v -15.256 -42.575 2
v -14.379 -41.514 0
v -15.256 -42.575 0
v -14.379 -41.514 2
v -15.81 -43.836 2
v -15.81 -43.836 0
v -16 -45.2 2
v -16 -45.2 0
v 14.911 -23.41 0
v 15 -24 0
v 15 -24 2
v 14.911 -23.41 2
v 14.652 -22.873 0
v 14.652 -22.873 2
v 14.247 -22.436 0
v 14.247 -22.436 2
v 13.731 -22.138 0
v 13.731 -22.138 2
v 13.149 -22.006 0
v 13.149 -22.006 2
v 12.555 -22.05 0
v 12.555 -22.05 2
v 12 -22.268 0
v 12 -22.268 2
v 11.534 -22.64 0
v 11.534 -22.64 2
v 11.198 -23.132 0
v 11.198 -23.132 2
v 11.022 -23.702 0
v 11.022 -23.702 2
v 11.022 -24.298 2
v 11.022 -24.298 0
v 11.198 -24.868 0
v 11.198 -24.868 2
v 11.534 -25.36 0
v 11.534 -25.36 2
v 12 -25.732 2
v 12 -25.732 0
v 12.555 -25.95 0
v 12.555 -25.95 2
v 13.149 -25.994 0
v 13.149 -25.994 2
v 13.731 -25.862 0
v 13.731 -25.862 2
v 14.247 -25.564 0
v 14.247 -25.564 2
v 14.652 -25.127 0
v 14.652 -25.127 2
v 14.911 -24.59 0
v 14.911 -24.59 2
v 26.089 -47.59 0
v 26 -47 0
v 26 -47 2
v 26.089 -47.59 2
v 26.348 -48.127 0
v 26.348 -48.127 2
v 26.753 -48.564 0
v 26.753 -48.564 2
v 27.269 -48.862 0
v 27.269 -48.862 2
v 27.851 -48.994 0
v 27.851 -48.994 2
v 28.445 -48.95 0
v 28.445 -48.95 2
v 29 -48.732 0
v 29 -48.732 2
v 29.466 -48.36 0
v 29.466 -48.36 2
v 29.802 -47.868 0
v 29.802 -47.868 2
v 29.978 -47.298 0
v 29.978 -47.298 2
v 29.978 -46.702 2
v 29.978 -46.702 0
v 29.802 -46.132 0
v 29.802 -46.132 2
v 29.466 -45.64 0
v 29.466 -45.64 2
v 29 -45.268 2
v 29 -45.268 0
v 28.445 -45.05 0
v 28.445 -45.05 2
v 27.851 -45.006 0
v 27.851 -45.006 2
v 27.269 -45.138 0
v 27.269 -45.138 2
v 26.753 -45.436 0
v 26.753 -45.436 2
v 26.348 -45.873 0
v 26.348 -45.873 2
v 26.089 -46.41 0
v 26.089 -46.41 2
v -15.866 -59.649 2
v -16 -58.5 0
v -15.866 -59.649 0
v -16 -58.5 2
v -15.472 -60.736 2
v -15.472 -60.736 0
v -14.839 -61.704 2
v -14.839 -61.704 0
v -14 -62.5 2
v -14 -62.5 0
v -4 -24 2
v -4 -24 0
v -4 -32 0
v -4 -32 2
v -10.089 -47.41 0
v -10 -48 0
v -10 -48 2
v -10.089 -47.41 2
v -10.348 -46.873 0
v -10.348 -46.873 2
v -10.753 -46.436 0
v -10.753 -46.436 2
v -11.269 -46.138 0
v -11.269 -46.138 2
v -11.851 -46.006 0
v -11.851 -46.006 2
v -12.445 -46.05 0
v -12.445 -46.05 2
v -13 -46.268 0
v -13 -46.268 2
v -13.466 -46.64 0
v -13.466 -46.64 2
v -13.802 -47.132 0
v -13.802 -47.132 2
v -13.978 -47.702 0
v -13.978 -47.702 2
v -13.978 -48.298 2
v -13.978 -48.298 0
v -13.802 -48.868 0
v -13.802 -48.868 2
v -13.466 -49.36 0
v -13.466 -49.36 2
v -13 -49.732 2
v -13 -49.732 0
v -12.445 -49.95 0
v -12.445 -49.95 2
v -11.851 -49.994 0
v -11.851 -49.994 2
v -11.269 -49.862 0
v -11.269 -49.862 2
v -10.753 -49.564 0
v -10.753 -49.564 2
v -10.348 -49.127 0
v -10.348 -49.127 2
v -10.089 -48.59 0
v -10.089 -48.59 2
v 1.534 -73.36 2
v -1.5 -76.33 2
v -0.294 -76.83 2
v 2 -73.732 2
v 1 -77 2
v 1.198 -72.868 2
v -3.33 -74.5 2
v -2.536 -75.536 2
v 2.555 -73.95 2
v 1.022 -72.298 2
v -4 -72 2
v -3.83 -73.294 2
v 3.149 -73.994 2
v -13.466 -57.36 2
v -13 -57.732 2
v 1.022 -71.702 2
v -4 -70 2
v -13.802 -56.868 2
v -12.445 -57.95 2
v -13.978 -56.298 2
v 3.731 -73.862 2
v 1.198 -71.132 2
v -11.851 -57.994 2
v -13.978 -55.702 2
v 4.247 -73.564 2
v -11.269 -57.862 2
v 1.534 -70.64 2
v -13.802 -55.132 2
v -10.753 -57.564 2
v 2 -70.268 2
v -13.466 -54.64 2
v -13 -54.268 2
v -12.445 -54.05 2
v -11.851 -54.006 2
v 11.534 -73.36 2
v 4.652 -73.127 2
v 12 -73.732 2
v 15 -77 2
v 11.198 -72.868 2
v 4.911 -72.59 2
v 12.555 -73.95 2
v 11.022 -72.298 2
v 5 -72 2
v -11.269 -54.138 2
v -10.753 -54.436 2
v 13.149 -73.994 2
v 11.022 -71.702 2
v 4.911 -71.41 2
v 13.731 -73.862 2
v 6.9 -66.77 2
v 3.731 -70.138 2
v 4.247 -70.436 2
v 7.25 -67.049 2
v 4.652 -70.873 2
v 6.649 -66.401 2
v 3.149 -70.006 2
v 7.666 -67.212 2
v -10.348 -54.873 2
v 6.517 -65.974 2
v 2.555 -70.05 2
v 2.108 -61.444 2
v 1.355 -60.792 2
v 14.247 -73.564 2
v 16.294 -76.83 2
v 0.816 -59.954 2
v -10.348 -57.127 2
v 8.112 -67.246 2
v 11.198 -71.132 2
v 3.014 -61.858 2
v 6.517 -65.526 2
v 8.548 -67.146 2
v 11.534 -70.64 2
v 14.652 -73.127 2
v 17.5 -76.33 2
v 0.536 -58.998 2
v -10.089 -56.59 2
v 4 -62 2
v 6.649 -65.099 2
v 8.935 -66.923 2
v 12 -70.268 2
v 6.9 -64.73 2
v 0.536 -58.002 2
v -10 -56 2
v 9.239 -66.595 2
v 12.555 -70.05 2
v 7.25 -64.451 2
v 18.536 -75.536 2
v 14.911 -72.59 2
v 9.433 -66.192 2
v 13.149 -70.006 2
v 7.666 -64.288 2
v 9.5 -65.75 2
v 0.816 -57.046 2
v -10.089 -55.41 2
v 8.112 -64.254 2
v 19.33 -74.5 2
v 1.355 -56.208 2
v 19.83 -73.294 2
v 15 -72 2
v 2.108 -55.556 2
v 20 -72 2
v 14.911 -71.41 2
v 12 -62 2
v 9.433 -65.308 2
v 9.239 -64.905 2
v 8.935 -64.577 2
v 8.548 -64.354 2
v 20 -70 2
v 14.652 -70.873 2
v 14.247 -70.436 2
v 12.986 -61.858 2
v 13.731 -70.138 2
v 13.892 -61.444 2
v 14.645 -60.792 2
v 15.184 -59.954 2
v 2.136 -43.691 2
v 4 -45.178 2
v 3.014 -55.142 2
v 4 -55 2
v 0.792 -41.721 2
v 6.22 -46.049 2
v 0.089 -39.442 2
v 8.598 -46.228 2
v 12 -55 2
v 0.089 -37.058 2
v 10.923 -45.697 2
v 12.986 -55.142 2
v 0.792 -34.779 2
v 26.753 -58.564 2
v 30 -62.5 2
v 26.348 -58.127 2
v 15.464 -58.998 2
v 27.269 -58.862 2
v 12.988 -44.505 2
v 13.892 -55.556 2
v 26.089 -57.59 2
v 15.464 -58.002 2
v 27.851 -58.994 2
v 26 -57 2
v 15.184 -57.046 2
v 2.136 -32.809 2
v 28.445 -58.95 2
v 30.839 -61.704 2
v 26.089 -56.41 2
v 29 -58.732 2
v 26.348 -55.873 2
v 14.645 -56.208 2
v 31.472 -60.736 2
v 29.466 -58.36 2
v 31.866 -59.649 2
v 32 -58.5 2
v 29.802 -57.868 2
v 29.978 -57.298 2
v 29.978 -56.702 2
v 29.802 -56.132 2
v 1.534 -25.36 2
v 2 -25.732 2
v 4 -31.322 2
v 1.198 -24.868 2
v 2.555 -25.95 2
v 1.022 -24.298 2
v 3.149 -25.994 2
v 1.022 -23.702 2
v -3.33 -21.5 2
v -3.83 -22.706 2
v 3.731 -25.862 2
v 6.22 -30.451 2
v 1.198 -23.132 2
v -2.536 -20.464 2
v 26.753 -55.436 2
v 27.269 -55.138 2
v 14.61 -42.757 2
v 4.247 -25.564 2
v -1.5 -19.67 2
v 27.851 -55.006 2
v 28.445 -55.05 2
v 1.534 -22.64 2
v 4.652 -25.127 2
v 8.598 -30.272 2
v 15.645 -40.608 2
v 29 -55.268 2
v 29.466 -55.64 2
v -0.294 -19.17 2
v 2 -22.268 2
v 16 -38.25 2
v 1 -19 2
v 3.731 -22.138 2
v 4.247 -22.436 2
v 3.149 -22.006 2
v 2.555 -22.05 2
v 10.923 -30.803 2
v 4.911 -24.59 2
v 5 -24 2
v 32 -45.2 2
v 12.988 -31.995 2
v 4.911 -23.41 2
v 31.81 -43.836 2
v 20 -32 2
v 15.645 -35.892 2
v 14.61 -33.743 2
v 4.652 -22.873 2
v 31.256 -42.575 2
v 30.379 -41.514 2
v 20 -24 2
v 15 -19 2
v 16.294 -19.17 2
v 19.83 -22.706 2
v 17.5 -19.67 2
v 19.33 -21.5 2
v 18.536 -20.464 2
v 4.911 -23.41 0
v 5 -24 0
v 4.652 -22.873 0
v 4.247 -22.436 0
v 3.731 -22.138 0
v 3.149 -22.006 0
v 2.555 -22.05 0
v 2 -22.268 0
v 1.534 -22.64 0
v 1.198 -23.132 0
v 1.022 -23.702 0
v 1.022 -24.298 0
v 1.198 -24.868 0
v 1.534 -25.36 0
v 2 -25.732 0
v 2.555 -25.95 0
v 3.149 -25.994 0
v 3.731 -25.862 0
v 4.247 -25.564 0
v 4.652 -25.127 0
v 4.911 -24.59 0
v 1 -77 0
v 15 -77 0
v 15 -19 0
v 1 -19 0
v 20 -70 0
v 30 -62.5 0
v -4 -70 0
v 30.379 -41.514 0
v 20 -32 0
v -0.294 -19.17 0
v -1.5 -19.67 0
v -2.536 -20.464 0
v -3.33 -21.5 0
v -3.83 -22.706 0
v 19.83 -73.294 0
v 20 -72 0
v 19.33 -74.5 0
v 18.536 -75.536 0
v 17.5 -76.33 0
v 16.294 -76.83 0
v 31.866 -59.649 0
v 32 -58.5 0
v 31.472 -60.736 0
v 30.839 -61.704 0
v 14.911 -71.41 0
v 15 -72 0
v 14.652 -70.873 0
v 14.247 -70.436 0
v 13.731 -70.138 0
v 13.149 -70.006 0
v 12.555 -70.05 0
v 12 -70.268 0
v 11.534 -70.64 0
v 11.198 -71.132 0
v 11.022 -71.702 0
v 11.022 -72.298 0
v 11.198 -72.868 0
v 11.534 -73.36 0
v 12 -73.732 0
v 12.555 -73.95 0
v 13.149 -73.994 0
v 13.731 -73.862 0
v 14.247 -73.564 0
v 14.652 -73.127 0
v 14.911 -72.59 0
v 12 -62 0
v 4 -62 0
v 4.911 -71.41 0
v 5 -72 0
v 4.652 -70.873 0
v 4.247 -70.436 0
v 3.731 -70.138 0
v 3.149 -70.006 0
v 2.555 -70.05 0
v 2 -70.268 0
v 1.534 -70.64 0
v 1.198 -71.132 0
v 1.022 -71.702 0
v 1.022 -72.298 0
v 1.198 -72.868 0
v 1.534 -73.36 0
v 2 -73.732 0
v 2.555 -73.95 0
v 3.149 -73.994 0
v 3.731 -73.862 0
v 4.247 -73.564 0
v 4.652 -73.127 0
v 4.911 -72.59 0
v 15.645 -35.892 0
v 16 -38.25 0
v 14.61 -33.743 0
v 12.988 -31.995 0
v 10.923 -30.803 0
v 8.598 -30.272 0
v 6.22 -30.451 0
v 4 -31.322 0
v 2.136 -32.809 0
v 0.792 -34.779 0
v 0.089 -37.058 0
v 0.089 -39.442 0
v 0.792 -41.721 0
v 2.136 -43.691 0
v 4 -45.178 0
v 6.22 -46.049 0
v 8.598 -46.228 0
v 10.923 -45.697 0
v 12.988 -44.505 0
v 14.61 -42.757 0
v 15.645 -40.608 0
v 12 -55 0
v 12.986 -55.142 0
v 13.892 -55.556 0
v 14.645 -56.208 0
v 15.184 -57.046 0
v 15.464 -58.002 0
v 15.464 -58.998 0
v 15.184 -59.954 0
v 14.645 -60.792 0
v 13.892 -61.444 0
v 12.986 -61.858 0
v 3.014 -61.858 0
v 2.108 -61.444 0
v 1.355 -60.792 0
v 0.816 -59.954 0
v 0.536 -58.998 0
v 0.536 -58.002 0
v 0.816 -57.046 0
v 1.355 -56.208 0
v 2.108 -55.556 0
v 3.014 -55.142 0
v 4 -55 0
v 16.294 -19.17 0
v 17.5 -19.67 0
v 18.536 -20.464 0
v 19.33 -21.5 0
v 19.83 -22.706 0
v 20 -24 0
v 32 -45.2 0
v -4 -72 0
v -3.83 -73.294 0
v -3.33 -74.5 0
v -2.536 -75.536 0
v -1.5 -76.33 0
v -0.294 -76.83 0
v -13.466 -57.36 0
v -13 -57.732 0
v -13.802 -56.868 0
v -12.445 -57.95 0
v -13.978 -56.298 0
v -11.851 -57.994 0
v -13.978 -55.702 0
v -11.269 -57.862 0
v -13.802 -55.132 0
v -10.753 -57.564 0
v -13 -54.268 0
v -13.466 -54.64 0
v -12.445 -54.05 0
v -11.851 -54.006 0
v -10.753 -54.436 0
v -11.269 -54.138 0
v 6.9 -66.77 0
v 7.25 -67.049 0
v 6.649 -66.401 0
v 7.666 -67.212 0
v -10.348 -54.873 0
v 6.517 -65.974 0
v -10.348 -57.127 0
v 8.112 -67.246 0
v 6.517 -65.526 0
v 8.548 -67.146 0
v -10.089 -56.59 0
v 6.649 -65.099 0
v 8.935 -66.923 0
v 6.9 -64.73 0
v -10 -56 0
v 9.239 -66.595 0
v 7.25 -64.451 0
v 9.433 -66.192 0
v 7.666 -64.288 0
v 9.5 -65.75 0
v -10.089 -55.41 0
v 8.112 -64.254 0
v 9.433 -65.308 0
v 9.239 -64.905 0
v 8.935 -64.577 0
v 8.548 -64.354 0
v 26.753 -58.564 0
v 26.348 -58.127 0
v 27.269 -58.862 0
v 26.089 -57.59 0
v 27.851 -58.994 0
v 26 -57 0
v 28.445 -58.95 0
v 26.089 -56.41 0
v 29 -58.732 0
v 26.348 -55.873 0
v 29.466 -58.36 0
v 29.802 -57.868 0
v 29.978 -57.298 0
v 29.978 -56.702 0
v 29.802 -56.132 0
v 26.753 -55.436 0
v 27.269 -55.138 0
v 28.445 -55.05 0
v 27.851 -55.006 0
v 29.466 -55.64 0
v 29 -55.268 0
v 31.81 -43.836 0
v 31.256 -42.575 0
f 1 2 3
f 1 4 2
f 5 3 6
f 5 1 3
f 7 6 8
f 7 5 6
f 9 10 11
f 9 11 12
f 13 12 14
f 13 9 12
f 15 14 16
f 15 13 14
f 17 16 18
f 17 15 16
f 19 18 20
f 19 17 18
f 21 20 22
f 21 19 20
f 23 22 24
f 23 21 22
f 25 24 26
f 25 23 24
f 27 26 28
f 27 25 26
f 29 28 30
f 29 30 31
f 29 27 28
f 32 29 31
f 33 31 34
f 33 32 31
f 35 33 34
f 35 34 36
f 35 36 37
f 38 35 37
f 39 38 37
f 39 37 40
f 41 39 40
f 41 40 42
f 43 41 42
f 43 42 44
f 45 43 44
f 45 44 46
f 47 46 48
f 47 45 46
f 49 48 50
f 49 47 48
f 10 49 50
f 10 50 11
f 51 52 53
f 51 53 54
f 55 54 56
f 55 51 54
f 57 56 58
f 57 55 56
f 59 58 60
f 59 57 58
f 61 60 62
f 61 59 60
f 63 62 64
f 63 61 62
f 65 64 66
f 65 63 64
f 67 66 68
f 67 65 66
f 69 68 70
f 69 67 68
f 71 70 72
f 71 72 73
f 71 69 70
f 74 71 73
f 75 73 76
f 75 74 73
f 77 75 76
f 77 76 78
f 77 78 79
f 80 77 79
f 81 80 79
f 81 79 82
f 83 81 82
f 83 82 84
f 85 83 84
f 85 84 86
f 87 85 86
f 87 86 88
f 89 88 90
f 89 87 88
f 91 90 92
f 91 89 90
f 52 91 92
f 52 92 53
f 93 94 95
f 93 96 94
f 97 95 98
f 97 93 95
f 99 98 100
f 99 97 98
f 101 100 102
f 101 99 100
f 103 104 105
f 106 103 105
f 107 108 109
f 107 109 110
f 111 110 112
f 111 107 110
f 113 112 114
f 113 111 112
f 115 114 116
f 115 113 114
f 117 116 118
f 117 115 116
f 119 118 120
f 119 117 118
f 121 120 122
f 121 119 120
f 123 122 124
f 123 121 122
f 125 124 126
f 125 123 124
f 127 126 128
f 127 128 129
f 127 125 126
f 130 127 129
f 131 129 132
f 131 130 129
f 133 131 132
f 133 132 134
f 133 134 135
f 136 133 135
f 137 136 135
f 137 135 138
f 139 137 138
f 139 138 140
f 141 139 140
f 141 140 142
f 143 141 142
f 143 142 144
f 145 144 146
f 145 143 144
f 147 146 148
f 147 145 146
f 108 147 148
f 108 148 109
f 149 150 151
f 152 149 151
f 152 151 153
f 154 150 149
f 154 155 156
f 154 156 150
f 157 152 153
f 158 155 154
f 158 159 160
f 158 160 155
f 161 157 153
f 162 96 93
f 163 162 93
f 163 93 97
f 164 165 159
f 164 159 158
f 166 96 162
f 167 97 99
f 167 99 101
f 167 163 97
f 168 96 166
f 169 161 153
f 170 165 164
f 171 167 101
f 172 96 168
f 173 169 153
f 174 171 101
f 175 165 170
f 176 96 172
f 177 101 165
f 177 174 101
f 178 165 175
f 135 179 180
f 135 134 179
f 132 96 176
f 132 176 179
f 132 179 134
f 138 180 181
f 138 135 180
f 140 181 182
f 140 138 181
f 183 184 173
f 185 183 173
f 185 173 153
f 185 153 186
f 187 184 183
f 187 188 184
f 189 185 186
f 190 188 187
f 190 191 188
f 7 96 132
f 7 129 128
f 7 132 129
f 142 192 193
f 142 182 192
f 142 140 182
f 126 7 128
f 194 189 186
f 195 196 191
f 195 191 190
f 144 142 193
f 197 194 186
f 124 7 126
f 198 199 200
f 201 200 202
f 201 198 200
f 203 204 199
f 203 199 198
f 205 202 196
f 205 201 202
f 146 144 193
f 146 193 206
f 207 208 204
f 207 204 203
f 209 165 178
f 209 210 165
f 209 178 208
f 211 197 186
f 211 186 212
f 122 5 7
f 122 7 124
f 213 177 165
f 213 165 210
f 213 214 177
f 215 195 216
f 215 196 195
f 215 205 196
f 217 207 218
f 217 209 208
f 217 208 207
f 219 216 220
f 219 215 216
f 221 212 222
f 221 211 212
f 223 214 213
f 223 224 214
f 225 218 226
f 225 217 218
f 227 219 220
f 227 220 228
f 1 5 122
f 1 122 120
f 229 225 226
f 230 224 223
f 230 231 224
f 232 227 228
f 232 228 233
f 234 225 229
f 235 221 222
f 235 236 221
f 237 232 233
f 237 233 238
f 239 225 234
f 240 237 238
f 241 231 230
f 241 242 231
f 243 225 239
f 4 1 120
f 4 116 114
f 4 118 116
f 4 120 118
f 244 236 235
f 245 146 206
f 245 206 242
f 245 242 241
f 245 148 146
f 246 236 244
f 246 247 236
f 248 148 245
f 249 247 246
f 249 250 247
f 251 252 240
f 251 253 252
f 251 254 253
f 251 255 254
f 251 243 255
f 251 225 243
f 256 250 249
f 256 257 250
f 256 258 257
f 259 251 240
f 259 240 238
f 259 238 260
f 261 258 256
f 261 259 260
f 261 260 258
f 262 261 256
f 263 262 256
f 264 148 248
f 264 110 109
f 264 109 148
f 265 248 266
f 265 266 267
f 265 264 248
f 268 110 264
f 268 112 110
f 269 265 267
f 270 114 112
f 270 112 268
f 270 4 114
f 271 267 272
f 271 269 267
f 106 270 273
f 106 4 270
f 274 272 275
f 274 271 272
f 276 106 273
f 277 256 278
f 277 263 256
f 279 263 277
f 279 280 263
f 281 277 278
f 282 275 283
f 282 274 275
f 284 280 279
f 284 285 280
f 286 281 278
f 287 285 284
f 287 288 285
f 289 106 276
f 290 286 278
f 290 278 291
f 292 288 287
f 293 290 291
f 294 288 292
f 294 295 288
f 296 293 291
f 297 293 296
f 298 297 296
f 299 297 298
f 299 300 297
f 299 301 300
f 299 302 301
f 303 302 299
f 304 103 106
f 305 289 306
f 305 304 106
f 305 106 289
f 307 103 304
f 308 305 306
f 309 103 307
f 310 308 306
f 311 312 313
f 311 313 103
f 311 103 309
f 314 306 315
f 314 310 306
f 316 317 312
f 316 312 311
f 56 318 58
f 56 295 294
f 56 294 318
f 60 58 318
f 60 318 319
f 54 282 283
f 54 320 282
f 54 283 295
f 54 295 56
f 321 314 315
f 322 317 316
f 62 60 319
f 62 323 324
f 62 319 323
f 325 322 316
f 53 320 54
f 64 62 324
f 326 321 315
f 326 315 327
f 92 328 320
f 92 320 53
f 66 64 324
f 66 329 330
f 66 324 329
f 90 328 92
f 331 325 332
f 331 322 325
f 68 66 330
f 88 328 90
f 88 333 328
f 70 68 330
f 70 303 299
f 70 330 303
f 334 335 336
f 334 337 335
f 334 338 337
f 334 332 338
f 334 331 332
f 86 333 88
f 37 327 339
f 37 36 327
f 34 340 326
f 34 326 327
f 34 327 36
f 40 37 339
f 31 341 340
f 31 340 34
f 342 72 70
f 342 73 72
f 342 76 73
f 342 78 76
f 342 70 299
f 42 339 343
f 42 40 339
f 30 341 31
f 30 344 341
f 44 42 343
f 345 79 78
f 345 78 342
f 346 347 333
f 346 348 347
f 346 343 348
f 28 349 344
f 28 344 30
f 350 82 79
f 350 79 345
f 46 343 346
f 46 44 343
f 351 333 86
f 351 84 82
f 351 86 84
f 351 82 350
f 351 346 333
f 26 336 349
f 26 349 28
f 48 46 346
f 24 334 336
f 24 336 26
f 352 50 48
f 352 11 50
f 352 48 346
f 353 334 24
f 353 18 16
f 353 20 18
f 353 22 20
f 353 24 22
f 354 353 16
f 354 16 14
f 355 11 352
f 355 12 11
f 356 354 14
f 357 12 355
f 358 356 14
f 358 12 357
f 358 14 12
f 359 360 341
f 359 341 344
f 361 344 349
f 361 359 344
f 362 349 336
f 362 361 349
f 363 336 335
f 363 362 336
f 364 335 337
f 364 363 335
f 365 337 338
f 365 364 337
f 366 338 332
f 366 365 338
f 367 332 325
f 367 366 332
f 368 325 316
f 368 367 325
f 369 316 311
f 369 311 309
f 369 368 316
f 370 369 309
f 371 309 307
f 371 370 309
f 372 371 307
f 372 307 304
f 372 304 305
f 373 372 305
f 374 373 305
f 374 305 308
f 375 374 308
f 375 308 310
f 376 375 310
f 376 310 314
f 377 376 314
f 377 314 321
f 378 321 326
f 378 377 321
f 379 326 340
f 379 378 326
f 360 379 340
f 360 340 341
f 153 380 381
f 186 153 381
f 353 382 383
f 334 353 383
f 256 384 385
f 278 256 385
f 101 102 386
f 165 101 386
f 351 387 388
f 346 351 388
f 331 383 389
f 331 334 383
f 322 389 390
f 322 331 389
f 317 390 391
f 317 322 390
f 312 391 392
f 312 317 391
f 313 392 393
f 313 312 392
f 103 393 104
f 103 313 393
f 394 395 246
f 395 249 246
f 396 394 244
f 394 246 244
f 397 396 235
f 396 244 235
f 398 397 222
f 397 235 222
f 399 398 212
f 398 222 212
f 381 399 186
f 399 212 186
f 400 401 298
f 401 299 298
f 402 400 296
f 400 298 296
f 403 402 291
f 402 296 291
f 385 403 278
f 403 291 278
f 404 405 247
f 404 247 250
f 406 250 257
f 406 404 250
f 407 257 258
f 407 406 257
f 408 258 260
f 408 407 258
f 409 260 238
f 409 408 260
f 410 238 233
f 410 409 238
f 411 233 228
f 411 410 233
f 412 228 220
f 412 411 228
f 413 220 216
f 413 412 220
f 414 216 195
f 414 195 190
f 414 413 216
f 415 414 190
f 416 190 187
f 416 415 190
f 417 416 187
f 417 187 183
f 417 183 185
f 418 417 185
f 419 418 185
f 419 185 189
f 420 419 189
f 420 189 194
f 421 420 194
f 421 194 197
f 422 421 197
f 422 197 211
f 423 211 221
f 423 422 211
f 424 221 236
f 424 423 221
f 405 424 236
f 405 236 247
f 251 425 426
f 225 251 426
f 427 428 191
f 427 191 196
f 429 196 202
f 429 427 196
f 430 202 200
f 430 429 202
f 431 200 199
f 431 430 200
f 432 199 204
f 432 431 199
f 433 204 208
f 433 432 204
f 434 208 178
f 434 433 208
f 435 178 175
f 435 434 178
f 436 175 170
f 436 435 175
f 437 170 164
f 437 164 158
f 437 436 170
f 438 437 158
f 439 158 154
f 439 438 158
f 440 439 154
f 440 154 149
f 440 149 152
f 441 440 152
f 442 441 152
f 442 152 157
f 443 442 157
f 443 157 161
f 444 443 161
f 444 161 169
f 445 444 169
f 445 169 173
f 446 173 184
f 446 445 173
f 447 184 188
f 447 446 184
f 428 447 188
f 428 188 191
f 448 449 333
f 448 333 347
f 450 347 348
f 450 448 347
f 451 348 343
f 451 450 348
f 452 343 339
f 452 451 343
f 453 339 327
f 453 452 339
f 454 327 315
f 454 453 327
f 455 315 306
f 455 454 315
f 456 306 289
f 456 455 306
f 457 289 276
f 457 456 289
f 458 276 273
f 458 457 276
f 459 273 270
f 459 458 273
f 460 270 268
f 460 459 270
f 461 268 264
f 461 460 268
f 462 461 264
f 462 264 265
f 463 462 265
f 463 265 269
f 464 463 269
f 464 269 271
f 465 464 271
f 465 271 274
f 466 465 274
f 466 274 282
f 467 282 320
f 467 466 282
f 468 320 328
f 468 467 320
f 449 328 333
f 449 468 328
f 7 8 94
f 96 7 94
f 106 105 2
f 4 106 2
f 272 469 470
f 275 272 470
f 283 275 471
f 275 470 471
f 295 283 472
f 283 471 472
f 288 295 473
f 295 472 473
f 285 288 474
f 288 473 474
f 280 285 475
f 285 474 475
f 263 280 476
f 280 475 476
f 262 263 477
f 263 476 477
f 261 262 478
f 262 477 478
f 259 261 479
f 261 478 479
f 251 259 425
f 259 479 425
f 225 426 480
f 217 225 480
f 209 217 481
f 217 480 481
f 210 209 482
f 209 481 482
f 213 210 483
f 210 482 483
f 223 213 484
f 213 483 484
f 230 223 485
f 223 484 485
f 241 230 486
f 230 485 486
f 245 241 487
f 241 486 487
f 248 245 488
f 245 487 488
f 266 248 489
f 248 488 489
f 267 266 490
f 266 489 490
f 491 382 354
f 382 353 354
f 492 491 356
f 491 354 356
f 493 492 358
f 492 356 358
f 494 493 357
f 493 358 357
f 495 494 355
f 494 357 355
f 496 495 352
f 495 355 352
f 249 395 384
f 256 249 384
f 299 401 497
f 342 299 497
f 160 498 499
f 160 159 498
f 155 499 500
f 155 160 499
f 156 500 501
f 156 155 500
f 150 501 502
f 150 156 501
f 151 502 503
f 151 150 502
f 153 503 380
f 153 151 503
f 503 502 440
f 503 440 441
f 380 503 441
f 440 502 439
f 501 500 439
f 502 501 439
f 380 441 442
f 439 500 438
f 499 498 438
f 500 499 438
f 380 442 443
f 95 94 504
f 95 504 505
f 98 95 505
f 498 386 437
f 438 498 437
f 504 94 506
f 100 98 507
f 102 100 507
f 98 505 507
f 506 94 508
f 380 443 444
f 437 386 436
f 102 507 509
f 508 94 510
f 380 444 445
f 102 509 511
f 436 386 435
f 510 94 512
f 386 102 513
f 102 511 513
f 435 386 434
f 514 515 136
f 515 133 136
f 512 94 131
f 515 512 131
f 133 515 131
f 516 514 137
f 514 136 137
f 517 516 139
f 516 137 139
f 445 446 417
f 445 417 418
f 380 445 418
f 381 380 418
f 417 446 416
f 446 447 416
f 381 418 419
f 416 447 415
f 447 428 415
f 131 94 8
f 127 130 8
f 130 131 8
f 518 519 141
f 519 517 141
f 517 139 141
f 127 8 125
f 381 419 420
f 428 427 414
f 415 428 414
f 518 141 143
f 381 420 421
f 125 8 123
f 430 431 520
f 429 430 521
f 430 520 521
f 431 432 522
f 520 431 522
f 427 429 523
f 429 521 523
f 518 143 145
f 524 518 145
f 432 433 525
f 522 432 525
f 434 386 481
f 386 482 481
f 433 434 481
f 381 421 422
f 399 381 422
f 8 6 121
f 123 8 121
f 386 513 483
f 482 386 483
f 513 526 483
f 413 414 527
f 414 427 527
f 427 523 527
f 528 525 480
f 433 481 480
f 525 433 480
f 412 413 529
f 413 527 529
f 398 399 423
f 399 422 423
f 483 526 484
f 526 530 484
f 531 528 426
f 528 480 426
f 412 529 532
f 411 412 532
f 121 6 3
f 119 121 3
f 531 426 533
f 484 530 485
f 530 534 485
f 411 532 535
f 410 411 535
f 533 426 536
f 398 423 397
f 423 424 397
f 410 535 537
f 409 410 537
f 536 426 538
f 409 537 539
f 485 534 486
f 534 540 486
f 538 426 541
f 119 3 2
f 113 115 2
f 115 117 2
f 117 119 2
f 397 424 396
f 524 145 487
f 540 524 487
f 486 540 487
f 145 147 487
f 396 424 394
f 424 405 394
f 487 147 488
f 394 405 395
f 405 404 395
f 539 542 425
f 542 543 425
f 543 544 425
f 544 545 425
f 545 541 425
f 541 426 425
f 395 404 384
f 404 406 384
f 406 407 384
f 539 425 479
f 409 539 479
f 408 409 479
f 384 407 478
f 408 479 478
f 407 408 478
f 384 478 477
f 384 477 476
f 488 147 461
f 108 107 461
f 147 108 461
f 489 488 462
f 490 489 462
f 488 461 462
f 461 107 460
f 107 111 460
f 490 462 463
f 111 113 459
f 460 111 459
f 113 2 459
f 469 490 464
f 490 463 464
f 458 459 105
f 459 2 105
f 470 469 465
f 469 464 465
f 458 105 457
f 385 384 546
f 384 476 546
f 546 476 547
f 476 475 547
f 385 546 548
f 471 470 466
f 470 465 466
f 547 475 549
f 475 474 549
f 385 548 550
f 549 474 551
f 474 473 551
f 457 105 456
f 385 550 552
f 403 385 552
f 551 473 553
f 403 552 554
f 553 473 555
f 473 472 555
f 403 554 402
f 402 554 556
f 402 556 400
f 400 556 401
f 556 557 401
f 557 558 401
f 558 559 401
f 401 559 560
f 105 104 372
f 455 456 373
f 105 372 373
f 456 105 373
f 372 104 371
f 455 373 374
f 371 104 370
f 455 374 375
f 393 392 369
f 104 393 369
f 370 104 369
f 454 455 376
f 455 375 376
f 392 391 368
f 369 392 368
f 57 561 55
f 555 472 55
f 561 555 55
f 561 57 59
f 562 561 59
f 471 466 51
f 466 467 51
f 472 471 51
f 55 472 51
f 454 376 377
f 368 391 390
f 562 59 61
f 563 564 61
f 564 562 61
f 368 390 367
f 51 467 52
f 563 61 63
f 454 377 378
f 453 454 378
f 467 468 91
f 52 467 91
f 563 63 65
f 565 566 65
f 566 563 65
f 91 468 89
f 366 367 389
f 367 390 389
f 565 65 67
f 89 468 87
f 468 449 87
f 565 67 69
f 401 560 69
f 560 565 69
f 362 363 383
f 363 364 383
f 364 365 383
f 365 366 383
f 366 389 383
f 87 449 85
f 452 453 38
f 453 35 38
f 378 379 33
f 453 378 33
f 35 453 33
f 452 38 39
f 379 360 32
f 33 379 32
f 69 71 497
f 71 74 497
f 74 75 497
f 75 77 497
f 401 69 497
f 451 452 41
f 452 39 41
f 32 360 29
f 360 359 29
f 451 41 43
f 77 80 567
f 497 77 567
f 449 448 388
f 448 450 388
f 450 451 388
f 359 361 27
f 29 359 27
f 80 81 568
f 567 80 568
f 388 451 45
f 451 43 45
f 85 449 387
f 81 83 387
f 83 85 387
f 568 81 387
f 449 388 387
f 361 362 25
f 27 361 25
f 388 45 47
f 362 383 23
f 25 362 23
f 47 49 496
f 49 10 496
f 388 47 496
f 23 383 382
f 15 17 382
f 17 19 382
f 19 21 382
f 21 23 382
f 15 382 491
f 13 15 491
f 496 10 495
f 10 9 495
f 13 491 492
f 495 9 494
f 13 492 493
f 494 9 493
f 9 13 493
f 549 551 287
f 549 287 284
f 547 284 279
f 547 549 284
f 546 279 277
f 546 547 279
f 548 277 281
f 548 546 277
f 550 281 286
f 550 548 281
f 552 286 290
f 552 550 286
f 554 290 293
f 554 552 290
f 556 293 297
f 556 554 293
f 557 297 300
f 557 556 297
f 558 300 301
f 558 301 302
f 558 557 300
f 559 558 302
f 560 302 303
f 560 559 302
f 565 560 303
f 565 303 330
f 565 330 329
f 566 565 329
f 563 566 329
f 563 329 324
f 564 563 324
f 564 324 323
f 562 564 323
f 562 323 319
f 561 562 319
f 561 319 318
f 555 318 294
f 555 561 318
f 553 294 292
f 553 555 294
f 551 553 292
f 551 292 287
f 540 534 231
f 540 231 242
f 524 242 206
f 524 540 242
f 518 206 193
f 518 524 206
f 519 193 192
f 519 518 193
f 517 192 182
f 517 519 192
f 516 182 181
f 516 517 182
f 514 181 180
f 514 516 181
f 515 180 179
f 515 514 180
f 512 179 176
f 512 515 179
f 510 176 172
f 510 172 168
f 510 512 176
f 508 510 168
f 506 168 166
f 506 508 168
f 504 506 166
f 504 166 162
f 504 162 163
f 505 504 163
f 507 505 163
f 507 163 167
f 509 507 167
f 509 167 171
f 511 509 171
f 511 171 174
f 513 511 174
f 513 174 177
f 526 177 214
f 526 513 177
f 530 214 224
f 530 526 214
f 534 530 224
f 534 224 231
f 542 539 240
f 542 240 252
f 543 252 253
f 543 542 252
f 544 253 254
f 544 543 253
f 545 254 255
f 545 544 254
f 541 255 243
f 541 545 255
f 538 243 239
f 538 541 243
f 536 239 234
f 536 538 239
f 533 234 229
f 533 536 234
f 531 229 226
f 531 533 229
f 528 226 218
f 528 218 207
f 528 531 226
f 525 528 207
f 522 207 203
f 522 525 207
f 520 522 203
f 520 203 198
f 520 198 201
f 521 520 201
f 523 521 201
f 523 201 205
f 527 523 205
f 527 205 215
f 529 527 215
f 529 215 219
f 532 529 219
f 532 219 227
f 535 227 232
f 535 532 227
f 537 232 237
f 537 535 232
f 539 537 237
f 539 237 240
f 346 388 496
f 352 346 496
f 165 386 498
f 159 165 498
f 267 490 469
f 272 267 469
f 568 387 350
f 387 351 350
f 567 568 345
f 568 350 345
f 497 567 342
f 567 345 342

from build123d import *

# Parameters (mm, degrees)
SKETCH_1_R      = 1.5
SKETCH_1_R_2    = 8
SKETCH_1_R_3    = 2
EXTRUDE_1_DEPTH = 2
FILLET_1_R      = 5


with BuildPart() as part:
    # 草图1 → 凸台-拉伸1 (new body)
    with BuildSketch(Plane.XY):
        Polygon((20, -19), (-4, -19), (-4, -32), (-16, -43), (-16, -61), (-4, -70), (-4, -77), (20, -77), (20, -70), (32, -61), (32, -43), (20, -32), align=None)
        with Locations((8, -65.75)):
            Circle(SKETCH_1_R, mode=Mode.SUBTRACT)
        with Locations((8, -38.25)):
            Circle(SKETCH_1_R_2, mode=Mode.SUBTRACT)
        with Locations((3, -72)):
            Circle(SKETCH_1_R_3, mode=Mode.SUBTRACT)
        with Locations((13, -72)):
            Circle(SKETCH_1_R_3, mode=Mode.SUBTRACT)
        with Locations((-12, -48)):
            Circle(SKETCH_1_R_3, mode=Mode.SUBTRACT)
        with Locations((-12, -56)):
            Circle(SKETCH_1_R_3, mode=Mode.SUBTRACT)
        with Locations(Location((28, -57, 0), (0, 0, 180))):
            Circle(SKETCH_1_R_3, mode=Mode.SUBTRACT)
        with Locations(Location((28, -47, 0), (0, 0, 180))):
            Circle(SKETCH_1_R_3, mode=Mode.SUBTRACT)
        with Locations((3, -24)):
            Circle(SKETCH_1_R_3, mode=Mode.SUBTRACT)
        with Locations((13, -24)):
            Circle(SKETCH_1_R_3, mode=Mode.SUBTRACT)
        with BuildLine():
            Line((4, -55), (12, -55))
            ThreePointArc((12, -55), (15.5, -58.5), (12, -62))
            Line((12, -62), (4, -62))
            ThreePointArc((4, -62), (0.5, -58.5), (4, -55))
        make_face(mode=Mode.SUBTRACT)
    extrude(amount=EXTRUDE_1_DEPTH)

    # 圆角1
    fillet_1_edges = [part.edges().sort_by_distance(p)[0] for p in [
        (32, -43, 1),
        (20, -19, 1),
        (-4, -19, 1),
        (-16, -43, 1),
        (-16, -61, 1),
        (-4, -77, 1),
        (20, -77, 1),
        (32, -61, 1),
    ]]
    fillet(fillet_1_edges, radius=FILLET_1_R)


solid = part.part
